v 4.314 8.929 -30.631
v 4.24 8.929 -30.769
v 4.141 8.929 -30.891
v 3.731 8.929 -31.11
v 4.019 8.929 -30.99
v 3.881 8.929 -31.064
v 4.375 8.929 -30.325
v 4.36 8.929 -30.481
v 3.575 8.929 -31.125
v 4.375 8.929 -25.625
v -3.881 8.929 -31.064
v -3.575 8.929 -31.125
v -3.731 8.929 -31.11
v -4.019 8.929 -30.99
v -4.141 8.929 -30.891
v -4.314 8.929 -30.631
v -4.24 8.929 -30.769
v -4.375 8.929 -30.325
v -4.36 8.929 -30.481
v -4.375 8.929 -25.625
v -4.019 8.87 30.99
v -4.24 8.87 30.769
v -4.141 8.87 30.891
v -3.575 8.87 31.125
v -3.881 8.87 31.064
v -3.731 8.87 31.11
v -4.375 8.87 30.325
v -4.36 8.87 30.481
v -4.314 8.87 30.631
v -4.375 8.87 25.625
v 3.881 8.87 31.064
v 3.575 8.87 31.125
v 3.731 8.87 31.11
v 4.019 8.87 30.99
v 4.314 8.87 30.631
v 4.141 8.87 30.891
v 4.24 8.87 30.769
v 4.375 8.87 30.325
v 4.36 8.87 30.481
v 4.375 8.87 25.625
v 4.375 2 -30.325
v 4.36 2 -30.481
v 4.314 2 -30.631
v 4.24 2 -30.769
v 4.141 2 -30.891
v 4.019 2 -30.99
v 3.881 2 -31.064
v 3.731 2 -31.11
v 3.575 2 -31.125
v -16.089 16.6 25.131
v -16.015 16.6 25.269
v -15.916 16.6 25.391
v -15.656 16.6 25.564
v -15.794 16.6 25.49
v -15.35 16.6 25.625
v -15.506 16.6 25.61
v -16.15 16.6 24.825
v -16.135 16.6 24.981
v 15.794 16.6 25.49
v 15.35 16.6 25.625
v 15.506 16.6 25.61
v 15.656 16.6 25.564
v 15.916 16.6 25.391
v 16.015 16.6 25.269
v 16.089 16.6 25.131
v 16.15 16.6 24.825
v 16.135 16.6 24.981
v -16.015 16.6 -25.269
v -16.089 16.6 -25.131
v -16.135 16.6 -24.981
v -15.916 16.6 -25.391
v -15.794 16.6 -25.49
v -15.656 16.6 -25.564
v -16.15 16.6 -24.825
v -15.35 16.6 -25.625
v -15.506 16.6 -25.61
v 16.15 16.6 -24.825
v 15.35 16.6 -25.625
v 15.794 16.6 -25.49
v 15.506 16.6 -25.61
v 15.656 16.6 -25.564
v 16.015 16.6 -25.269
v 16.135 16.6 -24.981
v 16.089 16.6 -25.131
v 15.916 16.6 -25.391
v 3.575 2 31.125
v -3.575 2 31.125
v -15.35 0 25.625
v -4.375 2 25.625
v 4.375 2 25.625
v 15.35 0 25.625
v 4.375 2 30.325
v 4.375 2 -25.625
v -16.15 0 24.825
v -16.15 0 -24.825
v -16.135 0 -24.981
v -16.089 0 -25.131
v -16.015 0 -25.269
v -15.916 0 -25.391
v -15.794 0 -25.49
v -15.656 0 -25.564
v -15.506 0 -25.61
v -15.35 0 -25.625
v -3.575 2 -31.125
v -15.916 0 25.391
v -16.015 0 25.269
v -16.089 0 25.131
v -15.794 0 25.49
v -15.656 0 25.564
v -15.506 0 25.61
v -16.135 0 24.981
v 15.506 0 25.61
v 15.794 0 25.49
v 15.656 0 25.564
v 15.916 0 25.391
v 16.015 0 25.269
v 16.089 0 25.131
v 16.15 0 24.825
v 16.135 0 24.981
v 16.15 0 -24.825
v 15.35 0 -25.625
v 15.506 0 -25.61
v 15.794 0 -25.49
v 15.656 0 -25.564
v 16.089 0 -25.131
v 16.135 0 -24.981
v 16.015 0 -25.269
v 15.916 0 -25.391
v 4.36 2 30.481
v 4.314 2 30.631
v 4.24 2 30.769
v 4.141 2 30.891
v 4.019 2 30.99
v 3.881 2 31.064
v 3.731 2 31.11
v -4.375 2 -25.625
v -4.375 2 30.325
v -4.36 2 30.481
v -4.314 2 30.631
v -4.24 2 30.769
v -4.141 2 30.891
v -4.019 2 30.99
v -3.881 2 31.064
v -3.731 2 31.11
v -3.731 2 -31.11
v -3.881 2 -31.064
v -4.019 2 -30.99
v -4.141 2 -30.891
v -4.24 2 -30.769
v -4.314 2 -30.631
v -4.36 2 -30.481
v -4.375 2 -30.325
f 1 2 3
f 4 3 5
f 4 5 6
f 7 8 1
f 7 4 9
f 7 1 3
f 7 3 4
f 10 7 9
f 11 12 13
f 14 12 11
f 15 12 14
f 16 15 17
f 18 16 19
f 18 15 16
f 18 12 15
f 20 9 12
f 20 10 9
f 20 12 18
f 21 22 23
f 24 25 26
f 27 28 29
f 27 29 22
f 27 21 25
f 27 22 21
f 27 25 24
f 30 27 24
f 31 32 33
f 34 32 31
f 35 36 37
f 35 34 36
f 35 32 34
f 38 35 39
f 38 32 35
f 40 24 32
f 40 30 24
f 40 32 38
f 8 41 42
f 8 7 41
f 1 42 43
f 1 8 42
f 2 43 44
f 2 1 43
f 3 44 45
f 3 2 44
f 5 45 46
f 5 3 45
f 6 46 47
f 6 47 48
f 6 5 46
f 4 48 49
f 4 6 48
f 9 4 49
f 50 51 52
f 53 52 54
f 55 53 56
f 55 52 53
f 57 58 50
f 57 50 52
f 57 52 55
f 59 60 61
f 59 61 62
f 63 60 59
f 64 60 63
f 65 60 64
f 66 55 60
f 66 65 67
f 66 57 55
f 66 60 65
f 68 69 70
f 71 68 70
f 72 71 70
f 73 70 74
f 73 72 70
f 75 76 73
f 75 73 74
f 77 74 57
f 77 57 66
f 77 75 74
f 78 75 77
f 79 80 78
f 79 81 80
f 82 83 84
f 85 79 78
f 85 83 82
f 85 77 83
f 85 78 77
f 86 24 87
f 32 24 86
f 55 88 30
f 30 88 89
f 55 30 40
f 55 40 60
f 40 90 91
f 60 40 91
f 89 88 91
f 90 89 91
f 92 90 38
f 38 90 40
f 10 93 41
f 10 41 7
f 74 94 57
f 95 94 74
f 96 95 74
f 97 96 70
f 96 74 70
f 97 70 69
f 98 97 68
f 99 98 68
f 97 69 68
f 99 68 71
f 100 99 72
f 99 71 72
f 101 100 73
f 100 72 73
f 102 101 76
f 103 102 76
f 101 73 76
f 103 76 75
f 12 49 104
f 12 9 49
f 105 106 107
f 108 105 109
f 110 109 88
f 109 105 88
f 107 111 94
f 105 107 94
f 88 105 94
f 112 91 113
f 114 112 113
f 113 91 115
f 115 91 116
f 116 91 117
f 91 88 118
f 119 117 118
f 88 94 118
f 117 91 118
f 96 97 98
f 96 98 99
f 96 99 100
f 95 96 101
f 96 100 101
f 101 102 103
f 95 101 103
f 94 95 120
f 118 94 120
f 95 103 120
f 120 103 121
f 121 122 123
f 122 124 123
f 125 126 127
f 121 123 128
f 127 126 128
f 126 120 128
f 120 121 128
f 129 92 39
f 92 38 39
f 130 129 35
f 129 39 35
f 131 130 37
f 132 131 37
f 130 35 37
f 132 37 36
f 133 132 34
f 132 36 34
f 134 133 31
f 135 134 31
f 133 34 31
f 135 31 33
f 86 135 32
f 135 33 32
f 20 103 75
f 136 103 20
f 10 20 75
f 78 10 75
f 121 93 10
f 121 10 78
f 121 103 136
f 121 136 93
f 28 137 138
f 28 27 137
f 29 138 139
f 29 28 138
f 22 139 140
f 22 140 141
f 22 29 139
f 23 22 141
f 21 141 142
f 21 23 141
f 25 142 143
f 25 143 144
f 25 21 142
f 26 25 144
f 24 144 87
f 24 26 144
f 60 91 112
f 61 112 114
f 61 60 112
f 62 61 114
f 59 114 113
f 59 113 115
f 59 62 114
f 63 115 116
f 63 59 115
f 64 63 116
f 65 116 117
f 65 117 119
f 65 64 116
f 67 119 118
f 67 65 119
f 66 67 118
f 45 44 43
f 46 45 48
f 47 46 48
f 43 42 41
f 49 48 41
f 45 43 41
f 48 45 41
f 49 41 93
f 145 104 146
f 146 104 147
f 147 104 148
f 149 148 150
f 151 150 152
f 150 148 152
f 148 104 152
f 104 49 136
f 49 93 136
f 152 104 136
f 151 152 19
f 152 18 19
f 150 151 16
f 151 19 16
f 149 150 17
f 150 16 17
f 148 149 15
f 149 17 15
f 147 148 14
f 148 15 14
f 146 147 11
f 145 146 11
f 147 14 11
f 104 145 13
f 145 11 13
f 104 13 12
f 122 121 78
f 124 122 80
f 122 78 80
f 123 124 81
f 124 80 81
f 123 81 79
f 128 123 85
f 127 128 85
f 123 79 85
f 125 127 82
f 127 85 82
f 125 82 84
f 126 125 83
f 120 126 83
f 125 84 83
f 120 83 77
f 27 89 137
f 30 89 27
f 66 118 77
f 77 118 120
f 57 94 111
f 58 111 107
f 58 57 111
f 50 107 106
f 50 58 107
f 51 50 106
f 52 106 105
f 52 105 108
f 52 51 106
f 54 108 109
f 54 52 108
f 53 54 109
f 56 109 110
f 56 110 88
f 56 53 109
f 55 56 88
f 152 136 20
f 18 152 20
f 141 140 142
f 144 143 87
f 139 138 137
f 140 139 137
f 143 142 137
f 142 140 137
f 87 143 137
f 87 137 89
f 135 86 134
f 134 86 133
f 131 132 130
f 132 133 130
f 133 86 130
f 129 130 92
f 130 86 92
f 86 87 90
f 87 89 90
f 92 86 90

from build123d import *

# Parameters (mm, degrees)
SKETCH1_W           = 32.3
SKETCH1_H           = 51.25
BOSS_EXTRUDE2_DEPTH = 16.6
SKETCH2_W           = 8.75
SKETCH2_H           = 6.87
BOSS_EXTRUDE3_DEPTH = 5.5
SKETCH3_W           = 8.75
SKETCH3_H           = 6.929487278
BOSS_EXTRUDE4_DEPTH = 5.5
FILLET1_R           = 0.8


with BuildPart() as part:
    # Sketch1 → Boss-Extrude2 (new body)
    with BuildSketch(Plane(origin=(0, 0, 0), x_dir=(1, 0, 0), z_dir=(0, 1, 0))):
        Rectangle(SKETCH1_W, SKETCH1_H)
    extrude(amount=BOSS_EXTRUDE2_DEPTH)

    # Sketch2 → Boss-Extrude3 (add)
    with BuildSketch(Plane.XY.offset(25.625)):
        with Locations((0, 5.435)):
            Rectangle(SKETCH2_W, SKETCH2_H)
    extrude(amount=BOSS_EXTRUDE3_DEPTH)

    # Sketch3 → Boss-Extrude4 (add)
    with BuildSketch(Plane(origin=(0, 0, -25.625), x_dir=(-1, 0, 0), z_dir=(0, 0, -1))):
        with Locations((0, 5.464743639)):
            Rectangle(SKETCH3_W, SKETCH3_H)
    extrude(amount=BOSS_EXTRUDE4_DEPTH)

    # Fillet1
    fillet1_edges = [part.edges().sort_by_distance(p)[0] for p in [
        (-4.375, 5.435, 31.125),
        (4.375, 5.435, 31.125),
        (4.375, 5.464743639, -31.125),
        (-4.375, 5.464743639, -31.125),
        (-16.15, 8.3, -25.625),
        (16.15, 8.3, -25.625),
        (16.15, 8.3, 25.625),
        (-16.15, 8.3, 25.625),
    ]]
    fillet(fillet1_edges, radius=FILLET1_R)


solid = part.part
